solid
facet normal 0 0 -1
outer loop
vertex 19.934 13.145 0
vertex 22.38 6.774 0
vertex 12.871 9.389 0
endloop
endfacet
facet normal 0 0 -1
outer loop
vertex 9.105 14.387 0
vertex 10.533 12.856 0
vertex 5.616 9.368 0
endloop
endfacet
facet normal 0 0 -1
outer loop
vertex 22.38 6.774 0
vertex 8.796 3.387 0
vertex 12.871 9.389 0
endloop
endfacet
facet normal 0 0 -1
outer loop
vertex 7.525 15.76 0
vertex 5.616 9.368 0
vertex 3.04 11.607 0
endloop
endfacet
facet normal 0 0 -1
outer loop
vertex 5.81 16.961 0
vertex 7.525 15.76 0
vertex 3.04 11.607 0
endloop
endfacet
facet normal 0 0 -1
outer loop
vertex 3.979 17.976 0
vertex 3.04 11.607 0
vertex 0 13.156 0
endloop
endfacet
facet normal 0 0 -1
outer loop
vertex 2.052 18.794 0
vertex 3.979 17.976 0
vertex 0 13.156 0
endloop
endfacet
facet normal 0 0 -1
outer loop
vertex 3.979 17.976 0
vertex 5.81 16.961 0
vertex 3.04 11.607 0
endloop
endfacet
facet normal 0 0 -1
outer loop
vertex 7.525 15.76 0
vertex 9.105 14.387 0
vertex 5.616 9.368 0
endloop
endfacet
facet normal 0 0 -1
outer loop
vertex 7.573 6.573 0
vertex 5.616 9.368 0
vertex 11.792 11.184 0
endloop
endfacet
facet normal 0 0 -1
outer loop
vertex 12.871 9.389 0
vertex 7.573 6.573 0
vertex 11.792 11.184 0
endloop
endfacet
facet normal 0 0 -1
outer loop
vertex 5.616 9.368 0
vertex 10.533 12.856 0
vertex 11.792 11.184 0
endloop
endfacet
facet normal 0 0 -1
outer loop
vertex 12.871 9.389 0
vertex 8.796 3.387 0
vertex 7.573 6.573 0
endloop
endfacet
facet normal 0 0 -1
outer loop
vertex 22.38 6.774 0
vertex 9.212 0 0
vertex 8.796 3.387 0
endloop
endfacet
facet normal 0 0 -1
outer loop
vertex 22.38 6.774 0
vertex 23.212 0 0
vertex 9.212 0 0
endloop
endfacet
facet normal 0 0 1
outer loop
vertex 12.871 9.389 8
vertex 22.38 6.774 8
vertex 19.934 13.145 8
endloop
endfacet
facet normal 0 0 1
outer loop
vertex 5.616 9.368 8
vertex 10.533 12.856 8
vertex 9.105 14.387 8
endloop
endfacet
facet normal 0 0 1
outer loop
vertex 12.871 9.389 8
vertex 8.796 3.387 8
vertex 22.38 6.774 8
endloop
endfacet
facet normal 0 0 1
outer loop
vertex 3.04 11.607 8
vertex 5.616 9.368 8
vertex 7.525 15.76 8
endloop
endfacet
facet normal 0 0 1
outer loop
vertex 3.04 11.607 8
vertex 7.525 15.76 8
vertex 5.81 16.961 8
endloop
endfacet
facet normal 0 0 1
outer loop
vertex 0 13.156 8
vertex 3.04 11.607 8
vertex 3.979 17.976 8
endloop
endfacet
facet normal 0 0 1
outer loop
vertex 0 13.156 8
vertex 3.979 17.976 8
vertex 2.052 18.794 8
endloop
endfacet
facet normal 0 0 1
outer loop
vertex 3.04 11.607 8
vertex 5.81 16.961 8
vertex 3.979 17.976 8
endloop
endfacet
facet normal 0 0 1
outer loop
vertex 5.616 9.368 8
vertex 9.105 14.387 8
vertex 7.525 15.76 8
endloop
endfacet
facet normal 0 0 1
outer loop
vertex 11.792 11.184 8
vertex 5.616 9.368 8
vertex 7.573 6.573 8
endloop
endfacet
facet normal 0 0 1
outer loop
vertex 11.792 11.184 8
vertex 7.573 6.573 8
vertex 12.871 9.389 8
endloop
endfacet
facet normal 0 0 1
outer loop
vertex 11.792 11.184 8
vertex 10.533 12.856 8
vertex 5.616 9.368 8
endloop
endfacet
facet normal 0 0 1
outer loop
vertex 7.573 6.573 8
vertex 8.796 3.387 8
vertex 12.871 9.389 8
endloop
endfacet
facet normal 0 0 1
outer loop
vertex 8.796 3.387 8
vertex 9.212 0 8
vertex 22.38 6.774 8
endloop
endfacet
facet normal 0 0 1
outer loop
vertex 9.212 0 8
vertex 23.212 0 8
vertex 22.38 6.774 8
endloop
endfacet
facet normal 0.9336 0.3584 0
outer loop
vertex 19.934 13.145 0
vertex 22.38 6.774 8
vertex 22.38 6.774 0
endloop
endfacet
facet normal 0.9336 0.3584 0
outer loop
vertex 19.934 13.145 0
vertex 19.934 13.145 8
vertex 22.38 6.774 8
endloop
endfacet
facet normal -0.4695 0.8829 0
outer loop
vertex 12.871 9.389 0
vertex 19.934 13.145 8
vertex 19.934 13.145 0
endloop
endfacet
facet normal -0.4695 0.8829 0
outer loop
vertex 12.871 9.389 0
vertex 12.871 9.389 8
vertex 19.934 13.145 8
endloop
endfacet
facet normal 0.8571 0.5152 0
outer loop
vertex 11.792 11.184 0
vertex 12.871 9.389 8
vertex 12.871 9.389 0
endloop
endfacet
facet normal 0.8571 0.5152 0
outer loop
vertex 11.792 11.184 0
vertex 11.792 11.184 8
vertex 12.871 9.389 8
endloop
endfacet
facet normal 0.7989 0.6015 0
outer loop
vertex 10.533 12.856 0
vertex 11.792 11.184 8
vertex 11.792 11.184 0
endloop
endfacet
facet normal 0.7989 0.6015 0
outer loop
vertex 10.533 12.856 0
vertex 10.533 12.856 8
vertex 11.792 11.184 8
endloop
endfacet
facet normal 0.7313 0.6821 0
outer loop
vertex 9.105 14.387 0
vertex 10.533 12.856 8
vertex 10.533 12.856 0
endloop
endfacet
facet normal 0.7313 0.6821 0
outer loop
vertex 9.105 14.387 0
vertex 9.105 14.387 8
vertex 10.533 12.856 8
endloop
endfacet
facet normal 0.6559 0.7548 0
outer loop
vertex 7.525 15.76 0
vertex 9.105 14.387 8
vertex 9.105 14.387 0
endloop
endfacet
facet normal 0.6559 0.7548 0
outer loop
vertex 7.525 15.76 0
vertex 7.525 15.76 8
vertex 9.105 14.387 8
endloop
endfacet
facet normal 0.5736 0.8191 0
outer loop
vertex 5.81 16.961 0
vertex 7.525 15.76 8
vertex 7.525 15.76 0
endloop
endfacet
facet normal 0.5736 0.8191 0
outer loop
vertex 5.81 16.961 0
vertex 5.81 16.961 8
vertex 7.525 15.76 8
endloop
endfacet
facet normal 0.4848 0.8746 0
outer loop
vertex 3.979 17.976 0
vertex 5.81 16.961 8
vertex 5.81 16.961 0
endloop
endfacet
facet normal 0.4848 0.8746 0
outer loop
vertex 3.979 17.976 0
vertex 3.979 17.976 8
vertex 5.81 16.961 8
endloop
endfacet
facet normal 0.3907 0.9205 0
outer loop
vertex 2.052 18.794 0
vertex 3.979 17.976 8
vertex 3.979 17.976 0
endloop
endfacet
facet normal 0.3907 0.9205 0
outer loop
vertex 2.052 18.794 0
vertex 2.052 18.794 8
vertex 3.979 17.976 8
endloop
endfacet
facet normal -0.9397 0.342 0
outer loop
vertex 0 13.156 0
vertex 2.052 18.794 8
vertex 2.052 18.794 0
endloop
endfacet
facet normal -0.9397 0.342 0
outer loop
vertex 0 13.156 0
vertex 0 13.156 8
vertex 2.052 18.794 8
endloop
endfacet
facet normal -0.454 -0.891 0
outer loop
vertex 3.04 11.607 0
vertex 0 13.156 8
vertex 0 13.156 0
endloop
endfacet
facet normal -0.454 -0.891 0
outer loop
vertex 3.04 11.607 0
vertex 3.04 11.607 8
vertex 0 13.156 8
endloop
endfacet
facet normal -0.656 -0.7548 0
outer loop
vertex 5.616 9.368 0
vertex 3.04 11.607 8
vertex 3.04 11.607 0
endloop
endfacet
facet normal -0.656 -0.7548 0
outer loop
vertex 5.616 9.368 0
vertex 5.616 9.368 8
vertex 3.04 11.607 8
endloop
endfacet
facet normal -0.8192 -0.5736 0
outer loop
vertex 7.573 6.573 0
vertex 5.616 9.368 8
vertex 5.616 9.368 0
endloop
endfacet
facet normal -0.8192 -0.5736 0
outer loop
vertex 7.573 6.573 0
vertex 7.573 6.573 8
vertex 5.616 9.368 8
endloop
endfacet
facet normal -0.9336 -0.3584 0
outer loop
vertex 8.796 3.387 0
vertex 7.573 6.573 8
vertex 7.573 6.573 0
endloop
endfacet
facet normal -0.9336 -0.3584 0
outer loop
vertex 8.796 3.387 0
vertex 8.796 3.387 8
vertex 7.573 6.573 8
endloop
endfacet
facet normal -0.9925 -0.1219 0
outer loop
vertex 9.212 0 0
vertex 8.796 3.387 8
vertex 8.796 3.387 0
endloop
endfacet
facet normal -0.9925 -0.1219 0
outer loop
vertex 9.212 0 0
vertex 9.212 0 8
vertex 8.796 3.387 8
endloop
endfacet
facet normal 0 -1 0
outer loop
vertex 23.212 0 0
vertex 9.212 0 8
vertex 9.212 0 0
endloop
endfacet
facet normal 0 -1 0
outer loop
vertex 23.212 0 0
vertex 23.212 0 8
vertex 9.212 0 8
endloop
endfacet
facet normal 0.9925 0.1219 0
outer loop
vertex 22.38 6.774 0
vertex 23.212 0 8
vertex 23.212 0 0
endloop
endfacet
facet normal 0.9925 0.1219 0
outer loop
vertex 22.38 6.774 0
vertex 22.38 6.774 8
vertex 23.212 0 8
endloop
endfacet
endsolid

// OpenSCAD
$fn = 32;

// ----------------------------------------------------------------------
// Arc stop: segment, 8 mm thick
// ----------------------------------------------------------------------

// --- parameters (mm) ---
profile_height = 8;       // extrusion height
profile_points = 17;      // points of the closed outline

profile = [[23.212, 0], [22.38, 6.774], [19.934, 13.145], [12.871, 9.389], [11.792, 11.184], [10.533, 12.856], [9.105, 14.387], [7.525, 15.76], [5.81, 16.961], [3.979, 17.976], [2.052, 18.794], [0, 13.156], [3.04, 11.607], [5.616, 9.368], [7.573, 6.573], [8.796, 3.387], [9.212, 0]];  // single closed polygon, 17 points, counter clockwise

// --- the one profile operation ---
linear_extrude(height = profile_height) polygon(points = profile);
